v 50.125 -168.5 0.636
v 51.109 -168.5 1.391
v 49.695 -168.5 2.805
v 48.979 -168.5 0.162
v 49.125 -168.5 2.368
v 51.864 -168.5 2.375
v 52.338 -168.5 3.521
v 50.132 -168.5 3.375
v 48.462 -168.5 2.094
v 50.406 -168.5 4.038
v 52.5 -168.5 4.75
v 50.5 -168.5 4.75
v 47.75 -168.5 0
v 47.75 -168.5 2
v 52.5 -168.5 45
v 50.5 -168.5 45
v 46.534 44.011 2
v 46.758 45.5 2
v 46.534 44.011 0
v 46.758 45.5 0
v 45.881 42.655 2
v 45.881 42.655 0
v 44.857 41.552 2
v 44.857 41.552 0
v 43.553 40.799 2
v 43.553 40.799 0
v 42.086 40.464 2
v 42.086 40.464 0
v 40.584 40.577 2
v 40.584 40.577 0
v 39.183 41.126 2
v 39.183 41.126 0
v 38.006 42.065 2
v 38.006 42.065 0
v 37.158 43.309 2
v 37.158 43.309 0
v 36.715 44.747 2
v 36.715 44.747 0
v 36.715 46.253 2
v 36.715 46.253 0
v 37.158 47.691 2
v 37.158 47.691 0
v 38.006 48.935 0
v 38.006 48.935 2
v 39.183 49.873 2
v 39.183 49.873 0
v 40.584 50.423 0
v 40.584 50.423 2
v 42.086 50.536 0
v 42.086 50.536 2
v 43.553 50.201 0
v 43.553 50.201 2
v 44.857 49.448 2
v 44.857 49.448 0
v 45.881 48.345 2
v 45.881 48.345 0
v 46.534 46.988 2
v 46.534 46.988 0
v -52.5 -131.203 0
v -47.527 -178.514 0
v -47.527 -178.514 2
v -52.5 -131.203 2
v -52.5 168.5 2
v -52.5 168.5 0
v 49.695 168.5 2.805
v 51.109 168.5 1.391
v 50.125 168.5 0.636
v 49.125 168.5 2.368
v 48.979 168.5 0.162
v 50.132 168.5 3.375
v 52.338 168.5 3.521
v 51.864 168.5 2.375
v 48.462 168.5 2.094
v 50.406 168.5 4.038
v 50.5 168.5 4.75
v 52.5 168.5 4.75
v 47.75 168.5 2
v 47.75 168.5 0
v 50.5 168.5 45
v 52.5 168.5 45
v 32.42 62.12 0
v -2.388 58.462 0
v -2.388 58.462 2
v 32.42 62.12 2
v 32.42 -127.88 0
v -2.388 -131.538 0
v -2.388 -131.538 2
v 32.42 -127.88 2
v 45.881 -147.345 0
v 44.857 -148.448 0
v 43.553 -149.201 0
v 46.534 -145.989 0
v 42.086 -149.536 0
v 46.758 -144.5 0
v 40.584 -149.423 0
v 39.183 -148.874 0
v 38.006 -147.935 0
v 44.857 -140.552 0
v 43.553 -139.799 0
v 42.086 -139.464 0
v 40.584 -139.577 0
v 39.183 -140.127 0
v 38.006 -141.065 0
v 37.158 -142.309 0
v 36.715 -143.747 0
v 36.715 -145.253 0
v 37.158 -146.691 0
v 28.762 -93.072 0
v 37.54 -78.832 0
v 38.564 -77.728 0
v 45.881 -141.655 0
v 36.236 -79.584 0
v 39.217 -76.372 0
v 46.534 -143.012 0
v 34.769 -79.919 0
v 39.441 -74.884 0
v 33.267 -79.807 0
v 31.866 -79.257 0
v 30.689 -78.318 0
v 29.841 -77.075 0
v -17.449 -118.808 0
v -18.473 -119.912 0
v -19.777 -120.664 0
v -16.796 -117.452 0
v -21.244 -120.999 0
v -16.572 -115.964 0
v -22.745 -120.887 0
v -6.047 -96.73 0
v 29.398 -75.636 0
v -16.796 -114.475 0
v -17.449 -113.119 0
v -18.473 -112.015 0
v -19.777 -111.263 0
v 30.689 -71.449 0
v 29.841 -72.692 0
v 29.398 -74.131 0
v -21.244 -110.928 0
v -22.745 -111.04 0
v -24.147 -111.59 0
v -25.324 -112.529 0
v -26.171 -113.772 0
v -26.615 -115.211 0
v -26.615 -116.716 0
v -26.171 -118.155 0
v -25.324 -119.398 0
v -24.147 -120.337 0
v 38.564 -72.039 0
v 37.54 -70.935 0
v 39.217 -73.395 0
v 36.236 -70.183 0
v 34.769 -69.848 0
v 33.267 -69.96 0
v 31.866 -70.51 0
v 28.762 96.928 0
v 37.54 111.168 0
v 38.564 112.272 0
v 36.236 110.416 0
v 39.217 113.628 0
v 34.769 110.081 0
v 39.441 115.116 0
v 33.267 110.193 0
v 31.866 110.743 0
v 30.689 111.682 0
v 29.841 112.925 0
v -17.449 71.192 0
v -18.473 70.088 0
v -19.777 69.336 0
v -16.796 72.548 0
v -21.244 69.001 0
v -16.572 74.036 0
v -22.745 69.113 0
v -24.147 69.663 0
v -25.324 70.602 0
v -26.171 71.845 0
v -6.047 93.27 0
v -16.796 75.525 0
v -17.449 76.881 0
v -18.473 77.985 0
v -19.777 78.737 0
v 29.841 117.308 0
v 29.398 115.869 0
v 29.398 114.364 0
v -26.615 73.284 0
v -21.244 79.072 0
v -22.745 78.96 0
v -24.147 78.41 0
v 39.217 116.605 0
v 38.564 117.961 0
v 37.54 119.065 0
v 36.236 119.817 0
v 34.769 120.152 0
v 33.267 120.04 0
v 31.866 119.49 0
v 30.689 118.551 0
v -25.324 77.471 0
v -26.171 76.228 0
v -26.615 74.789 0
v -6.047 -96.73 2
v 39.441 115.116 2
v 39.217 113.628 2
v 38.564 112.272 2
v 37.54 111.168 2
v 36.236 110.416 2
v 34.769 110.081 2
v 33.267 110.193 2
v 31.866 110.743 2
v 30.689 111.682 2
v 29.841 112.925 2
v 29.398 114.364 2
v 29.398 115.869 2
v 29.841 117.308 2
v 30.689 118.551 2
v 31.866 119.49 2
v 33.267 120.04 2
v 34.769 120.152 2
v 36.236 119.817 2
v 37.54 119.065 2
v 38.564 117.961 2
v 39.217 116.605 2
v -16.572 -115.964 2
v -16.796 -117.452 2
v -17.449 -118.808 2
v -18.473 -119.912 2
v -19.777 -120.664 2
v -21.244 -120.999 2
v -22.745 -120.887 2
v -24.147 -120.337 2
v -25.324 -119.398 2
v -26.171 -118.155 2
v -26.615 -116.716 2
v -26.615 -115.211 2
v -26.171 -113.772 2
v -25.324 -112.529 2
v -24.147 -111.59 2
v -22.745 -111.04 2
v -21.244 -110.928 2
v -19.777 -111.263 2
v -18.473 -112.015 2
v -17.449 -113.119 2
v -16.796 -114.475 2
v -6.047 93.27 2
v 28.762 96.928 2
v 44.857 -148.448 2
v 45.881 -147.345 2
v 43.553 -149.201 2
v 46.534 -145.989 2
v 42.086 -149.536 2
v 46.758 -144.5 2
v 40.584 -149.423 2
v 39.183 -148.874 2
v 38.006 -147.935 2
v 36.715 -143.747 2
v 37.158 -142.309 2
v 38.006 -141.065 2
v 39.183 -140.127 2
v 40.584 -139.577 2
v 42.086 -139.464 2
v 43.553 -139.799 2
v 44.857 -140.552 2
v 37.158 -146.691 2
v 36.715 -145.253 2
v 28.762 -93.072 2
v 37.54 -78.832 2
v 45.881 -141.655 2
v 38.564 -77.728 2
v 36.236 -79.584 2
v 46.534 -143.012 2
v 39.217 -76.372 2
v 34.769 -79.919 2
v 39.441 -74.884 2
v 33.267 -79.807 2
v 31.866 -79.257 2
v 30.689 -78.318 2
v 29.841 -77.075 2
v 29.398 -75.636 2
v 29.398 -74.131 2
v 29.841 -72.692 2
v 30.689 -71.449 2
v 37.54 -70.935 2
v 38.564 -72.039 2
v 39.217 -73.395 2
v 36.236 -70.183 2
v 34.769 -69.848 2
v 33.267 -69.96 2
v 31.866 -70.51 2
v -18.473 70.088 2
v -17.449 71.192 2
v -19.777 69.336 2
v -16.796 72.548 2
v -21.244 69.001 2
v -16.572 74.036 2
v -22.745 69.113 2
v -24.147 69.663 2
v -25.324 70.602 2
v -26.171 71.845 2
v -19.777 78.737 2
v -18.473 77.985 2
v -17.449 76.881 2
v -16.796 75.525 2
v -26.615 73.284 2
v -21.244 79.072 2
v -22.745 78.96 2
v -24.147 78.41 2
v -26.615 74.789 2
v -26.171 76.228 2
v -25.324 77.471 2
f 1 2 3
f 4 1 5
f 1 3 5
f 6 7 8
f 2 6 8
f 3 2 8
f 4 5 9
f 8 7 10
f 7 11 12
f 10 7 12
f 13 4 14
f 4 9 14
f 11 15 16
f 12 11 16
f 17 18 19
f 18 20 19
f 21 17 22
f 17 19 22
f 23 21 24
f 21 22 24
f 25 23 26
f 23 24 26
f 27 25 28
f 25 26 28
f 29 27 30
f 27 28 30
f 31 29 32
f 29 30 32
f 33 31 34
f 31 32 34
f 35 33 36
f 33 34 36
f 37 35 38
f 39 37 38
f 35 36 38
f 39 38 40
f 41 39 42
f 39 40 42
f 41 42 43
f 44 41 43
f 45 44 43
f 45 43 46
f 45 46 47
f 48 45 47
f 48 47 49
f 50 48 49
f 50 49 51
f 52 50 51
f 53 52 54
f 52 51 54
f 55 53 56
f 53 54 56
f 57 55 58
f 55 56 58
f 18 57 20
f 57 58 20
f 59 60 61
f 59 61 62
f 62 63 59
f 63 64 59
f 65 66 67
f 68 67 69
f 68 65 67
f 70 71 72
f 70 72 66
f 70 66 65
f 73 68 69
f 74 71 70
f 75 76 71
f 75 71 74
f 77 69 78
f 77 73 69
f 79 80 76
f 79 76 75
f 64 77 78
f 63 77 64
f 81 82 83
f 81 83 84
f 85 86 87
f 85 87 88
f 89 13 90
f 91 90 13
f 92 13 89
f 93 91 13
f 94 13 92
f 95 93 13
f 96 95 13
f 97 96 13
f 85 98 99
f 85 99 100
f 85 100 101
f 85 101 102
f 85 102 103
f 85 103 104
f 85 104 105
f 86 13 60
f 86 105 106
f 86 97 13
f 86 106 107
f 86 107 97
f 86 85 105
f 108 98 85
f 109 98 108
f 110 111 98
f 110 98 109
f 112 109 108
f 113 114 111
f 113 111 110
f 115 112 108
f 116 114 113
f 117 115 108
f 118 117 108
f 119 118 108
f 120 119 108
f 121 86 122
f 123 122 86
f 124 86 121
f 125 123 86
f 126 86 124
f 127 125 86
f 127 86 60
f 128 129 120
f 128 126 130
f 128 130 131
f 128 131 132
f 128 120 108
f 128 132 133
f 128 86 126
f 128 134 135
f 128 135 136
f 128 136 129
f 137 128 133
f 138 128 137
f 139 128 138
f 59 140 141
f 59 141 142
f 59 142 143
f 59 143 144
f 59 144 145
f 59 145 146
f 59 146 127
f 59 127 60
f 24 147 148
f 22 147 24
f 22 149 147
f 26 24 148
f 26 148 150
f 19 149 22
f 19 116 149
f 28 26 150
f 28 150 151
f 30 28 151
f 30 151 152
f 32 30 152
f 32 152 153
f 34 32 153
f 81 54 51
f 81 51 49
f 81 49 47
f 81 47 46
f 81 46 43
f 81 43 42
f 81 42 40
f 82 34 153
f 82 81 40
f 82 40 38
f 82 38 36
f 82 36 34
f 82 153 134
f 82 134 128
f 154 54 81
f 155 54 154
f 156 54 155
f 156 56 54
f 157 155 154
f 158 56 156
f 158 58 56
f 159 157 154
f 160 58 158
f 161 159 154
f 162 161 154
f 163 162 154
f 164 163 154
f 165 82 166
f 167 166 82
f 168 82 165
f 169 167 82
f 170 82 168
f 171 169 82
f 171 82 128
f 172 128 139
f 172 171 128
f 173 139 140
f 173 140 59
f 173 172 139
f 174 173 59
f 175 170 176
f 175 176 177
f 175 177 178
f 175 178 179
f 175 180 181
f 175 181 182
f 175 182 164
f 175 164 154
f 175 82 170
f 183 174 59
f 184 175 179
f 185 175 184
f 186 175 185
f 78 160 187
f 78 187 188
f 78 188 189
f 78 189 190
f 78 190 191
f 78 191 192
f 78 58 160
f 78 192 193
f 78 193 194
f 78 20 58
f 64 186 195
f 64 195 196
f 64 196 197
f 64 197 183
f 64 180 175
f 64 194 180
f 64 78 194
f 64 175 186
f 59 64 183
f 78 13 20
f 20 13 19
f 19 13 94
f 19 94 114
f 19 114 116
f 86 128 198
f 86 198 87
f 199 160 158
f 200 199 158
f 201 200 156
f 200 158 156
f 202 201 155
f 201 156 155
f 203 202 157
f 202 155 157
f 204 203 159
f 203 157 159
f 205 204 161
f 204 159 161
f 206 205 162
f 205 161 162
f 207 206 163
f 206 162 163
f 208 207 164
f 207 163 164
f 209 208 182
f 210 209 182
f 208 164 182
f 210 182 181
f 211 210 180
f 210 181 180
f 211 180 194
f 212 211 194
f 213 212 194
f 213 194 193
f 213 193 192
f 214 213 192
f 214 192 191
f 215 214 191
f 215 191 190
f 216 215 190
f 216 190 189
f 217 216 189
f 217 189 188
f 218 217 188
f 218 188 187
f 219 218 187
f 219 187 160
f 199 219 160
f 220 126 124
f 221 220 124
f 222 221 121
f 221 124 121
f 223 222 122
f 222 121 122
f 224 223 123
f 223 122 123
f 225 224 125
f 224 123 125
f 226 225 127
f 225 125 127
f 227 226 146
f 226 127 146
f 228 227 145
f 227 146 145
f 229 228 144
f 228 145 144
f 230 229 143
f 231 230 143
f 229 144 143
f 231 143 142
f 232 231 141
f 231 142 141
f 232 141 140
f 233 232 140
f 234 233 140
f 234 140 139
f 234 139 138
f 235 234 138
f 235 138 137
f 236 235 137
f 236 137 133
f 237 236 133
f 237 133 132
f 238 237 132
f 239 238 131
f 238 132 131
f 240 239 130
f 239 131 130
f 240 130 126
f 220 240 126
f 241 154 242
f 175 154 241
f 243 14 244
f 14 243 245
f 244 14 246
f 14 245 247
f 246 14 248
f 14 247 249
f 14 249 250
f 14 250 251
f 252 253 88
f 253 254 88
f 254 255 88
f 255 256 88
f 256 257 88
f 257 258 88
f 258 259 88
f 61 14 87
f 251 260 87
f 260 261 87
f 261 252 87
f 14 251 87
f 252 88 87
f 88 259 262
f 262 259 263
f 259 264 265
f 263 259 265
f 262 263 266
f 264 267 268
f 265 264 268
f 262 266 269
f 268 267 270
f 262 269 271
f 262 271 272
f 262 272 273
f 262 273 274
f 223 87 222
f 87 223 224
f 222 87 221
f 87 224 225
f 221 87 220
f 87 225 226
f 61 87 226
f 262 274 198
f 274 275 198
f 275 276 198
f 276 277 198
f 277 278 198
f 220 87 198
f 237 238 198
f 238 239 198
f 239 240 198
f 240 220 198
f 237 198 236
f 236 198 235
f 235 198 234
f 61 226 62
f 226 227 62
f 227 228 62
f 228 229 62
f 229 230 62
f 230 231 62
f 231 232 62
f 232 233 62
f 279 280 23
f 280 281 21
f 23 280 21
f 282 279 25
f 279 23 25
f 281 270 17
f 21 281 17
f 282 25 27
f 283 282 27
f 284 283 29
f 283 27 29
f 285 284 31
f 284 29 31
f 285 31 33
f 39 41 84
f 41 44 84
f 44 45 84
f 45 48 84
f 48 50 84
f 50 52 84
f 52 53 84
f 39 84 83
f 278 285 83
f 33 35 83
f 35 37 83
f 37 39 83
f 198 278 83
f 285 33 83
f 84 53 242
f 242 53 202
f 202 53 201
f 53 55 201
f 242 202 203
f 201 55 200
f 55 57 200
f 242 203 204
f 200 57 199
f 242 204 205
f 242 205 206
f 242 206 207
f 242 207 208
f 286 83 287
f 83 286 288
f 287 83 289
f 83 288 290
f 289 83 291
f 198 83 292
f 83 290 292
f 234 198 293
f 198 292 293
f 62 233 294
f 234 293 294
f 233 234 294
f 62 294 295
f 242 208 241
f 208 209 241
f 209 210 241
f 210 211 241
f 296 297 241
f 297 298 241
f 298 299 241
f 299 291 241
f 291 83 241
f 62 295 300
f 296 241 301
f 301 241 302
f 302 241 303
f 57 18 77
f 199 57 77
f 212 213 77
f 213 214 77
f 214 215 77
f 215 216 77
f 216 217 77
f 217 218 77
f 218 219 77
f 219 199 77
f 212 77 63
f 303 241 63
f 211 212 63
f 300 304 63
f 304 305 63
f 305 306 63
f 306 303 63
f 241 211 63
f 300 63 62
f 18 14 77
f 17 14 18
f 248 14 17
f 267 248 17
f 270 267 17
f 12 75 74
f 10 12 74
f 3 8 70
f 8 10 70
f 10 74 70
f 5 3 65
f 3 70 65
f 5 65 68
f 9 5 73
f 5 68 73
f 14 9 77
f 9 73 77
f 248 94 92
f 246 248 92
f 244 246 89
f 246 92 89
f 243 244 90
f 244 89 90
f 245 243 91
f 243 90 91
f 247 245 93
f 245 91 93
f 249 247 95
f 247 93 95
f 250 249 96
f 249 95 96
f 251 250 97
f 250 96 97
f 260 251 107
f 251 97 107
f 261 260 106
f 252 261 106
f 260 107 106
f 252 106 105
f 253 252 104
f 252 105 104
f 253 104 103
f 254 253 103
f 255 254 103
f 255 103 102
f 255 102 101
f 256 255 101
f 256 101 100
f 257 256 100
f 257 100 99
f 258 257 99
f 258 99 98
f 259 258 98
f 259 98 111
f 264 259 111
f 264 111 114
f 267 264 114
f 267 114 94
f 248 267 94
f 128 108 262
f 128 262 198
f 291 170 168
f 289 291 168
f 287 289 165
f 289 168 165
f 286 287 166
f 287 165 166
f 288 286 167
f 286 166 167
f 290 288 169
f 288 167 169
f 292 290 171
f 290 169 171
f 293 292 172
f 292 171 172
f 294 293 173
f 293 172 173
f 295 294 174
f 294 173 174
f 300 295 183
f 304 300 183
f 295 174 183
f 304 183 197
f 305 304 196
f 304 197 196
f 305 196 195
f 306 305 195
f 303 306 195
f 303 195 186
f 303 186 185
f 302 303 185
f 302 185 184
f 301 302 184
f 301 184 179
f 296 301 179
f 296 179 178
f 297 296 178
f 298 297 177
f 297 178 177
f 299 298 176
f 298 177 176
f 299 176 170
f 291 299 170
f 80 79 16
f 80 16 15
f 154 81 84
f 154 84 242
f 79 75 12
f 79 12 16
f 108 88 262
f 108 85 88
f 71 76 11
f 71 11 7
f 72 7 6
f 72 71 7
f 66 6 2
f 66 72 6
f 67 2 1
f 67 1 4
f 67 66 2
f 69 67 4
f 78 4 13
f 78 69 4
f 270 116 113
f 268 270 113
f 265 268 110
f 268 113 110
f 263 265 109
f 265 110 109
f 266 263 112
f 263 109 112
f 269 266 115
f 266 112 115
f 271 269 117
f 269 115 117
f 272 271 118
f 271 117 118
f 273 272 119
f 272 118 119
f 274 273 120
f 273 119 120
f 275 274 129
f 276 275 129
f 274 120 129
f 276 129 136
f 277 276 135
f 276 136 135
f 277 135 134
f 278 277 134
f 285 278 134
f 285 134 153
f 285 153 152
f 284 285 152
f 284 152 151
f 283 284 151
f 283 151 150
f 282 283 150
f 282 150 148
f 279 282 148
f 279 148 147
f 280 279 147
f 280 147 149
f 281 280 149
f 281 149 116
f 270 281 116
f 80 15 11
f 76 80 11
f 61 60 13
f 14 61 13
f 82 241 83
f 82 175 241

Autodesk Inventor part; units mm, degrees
ref_plane "YZ Plane" through (0, 0, 0) normal (1, 0, 0) x (0, 1, 0)
ref_plane "XZ Plane" through (0, 0, 0) normal (0, 1, 0) x (-1, 0, 0)
ref_plane "XY Plane" through (0, 0, 0) normal (0, 0, 1) x (1, 0, 0)
sketch "Sketch1" plane through (0, 0, 0) normal (0, 0, 1) x (1, 0, 0)
  line L0 (-52.5, 168.5) -> (52.5, 168.5)
  line L1 (52.5, 168.5) -> (52.5, -168.5)
  line L2 (52.5, -168.5) -> (-52.5, -168.5)
  line L3 (-52.5, -168.5) -> (-52.5, 168.5)
  line L4 (-52.5, 168.5) -> (52.5, -168.5) construction
  point P0 (0, 0)
  point P1 (0, 0)
  dimension "d0" = 105
  dimension "d1" = 337
extrude "Plate1" add sketch "Sketch1" along normal blind 2
sketch "Sketch4" plane through (50.5, 168.5, 0) normal (1, 0, 0) x (0, 1, 0)
  line L0 (-337, 0) -> (0, 0)
  line L1 (0, 0) -> (0, 45)
  line L2 (0, 45) -> (-337, 45)
  line L3 (-337, 45) -> (-337, 0)
edge flange "Flange1" height 45 angle 90 thickness 2 bend radius 2.75 thickness toward (1, 0, 0) relief round relief width 2 relief depth 1 edges at (52.5, 0, 2) wall of the first edge with corners at (50.5, -168.5, 0) (50.5, 168.5, 0) (50.5, 168.5, 45) (50.5, -168.5, 45)
bend "Bend1"
corner "Corner1"
sketch "Sketch5" plane through (0, 0, 0) normal (0, 0, -1) x (-1, 0, 0)
  line L0 (-47.75, 168.5) -> (-47.75, -168.5) projected
  line L1 (52.5, -168.5) -> (-47.75, -168.5) projected
  line L2 (52.5, 168.5) -> (52.5, -168.5) projected
  line L3 (-47.75, 168.5) -> (52.5, 168.5) projected
  line L4 (52.5, -168.5) -> (52.5, -179.0367)
  line L5 (-47.75, -168.5) -> (52.5, -168.5) projected
  line L6 (52.5, -179.0367) -> (-47.75, -168.5)
  point P0 (0, 0)
  dimension "d25" = 6
extrude "Extrusion2" add sketch "Sketch5" against normal up to surface (2 mm away) contours L1 L4 L6
sketch "Sketch6" plane through (0, 0, 0) normal (0, 0, -1) x (-1, 0, 0)
  line L0 (-47.75, 168.5) -> (-47.75, -168.5) construction
  line L1 (-47.75, -168.5) -> (52.5, -179.0367) projected
  line L2 (52.5, 168.5) -> (52.5, -179.0367) projected
  line L3 (-47.75, 168.5) -> (52.5, 168.5) construction
  line L4 (47.5274, -178.5141) -> (52.5, -131.2028)
  line L5 (-47.75, -168.5) -> (52.5, -179.0367) projected
  point P0 (0, 0)
  dimension "d29" = 5
extrude "Cut1" cut sketch "Sketch6" against normal blind 2
sketch "Sketch7" plane through (0, 0, 0) normal (0, 0, 1) x (1, 0, 0)
  line L0 (47.75, -168.5) -> (-47.5274, -178.5141) projected
  circle A0 centre (41.7082, -144.5001) radius 5.05
  line L1 (41.7082, -144.5001) -> (34.3912, -74.8835) construction
  line L2 (32.4201, -127.8799) -> (28.7616, -93.0716)
  circle A1 centre (34.3912, -74.8835) radius 5.05
  line L3 (-21.6216, -115.9635) -> (41.7082, -144.5001) construction
  line L4 (32.4201, -127.8799) -> (-6.0467, -96.7301) construction
  line L5 (28.7616, -93.0716) -> (-6.0467, -96.7301)
  line L6 (-2.3882, -131.5384) -> (32.4201, -127.8799)
  line L7 (28.7616, -93.0716) -> (-2.3882, -131.5384) construction
  line L8 (-6.0467, -96.7301) -> (-2.3882, -131.5384)
  line L9 (30.5908, -110.4758) -> (-21.6216, -115.9635) construction
  line L10 (34.3912, -74.8835) -> (-21.6216, -115.9635) construction
  circle A2 centre (-21.6216, -115.9635) radius 5.05
  point P0 (0, 0)
  point P1 (13.1867, -112.305)
  dimension "d32" = 35
  dimension "d33" = 35
  dimension "d34" = 10.1
  dimension "d35" = 70
  dimension "d36" = 60
  dimension "d37" = 25
  dimension "d38" = 11
  dimension "d39" = 42
extrude "Extrusion3" cut sketch "Sketch7" along normal through all
pattern_linear "Rectangular Pattern1" count 2 spacing 190 along (0, 1, 0) of "Extrusion3"
equation "\"d30\" = Thickness"
equation "\"d33\" = d32"
equation "\"d2\" = Thickness"
equation "\"d15\" = BendReliefWidth"
equation "\"d16\" = BendReliefDepth"
equation "\"d17\" = MinimumRemnant"
equation "\"d18\" = TransitionRadius"
equation "\"d21\" = BendRadius"
equation "\"d22\" = CornerReliefSize"
equation "\"d23\" = GapSize"
equation "\"d24\" = JacobiRadiusSize"
equation "\"BendReliefWidth\" = Thickness"
equation "\"BendReliefDepth\" = 0.5 * Thickness"
equation "\"CornerReliefSize\" = 4 * Thickness"
equation "\"MinimumRemnant\" = 2 * Thickness"
equation "\"TransitionRadius\" = BendRadius"
equation "\"JacobiRadiusSize\" = BendRadius"
equation "\"GapSize\" = Thickness"
equation "\"Thickness\" = 2"
equation "\"BendRadius\" = 2.75"
properties part number "MNT-CDF-603 CAP" material "Stainless Steel"
